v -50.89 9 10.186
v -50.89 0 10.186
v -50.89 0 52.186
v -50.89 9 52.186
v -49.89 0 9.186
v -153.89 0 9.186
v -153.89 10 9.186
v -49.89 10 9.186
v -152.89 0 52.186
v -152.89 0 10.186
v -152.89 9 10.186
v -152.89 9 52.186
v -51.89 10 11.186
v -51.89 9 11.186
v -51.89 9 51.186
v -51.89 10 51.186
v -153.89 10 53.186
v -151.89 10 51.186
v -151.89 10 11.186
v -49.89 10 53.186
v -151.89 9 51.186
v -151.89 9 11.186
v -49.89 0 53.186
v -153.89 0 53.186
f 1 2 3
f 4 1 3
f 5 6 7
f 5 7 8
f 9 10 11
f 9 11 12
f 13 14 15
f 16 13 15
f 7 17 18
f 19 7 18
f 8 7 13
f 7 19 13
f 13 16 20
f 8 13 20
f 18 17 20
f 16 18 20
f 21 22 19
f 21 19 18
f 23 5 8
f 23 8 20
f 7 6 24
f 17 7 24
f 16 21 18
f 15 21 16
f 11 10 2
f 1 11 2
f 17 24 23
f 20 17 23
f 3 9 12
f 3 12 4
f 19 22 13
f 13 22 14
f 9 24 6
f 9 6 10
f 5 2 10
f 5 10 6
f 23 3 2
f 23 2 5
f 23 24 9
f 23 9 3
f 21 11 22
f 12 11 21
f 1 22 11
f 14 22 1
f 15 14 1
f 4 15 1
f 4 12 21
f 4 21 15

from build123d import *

# Parameters (mm, degrees)
F0_W     = 104
F0_H     = 44
F0_W_2   = 100
F0_H_2   = 40
F1_DEPTH = 10
F2_T     = -1
F3_DEPTH = 25


with BuildPart() as f1:
    # F0 (on Front) → F1 (new body)
    with BuildSketch(Plane.XZ):
        with Locations((-101.889864, 31.185937)):
            Rectangle(F0_W, F0_H)
        with Locations((-101.889864, 31.185937)):
            Rectangle(F0_W_2, F0_H_2, mode=Mode.SUBTRACT)
        with Locations((-101.889864, 31.185937)):
            Rectangle(F0_W_2, F0_H_2)
    extrude(amount=-F1_DEPTH)

    # F2
    f2_openings = [f1.faces().sort_by_distance(p)[0] for p in [
        (-101.889864, 0, 31.185937),
    ]]
    offset(amount=F2_T, openings=f2_openings)

    # F0 (on Front) → F3 (cut)
    with BuildSketch(Plane.XZ):
        with Locations((-101.889864, 31.185937)):
            Rectangle(F0_W_2, F0_H_2)
    extrude(amount=-F3_DEPTH, mode=Mode.SUBTRACT)


solid = f1.part
